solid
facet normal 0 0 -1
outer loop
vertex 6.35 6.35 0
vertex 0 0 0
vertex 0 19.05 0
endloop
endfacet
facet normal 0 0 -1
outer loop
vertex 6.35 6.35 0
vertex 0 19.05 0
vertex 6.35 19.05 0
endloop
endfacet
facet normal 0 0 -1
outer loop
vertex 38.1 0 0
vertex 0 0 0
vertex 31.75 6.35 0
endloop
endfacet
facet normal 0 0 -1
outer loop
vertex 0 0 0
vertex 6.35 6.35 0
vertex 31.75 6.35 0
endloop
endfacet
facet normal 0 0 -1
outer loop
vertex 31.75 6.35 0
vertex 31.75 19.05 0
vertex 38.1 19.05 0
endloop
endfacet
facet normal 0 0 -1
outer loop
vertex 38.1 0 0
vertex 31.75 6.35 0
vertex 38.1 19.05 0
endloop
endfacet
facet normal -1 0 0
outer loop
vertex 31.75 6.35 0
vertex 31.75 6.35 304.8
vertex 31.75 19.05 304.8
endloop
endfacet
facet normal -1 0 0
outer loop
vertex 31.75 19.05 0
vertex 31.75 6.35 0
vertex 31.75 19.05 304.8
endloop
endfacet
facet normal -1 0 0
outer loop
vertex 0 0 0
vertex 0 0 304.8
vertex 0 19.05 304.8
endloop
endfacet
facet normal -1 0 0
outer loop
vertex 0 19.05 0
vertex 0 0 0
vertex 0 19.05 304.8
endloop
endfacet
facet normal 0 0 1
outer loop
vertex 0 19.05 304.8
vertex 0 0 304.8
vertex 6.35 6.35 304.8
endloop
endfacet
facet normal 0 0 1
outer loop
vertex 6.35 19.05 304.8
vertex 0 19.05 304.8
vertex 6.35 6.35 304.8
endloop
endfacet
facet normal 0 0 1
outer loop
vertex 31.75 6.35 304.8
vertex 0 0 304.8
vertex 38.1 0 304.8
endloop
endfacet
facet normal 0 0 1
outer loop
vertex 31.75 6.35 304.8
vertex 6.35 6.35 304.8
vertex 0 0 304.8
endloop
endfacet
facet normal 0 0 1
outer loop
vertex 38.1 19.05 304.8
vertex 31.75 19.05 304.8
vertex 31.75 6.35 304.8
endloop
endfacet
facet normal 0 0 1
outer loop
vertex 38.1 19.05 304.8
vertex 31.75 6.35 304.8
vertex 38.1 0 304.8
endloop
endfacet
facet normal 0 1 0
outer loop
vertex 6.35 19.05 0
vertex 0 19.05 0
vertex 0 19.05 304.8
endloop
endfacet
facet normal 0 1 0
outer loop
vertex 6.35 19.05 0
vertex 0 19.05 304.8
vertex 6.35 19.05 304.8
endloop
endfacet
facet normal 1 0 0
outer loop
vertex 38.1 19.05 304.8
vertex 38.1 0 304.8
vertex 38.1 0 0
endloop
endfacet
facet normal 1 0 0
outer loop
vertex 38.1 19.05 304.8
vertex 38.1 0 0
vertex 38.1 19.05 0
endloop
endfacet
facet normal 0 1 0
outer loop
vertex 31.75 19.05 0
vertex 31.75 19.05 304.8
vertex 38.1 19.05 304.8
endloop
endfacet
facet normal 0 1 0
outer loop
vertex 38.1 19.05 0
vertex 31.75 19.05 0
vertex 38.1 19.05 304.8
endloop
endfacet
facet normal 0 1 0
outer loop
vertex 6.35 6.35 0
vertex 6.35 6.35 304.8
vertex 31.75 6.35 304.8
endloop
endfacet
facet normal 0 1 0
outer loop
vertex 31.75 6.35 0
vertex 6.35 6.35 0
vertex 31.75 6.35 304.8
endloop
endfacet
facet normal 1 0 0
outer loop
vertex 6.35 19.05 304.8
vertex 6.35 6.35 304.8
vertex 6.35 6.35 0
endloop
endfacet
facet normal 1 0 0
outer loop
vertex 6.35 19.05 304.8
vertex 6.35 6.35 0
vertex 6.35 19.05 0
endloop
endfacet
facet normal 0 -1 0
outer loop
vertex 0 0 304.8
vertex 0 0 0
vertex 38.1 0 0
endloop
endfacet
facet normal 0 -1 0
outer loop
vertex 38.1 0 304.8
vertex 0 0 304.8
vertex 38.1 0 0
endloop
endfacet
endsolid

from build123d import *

# Parameters (mm, degrees)
SKETCH1_W           = 38.1
SKETCH1_H           = 19.05
BOSS_EXTRUDE1_DEPTH = 304.8
CUT_EXTRUDE1_REACH  = 309.762
SKETCH2_W           = 25.4
SKETCH2_H           = 12.7


with BuildPart() as part:
    # Sketch1 → Boss-Extrude1 (new body)
    with BuildSketch(Plane.XY):
        with Locations((19.05, 9.525)):
            Rectangle(SKETCH1_W, SKETCH1_H)
    extrude(amount=BOSS_EXTRUDE1_DEPTH)

    # Sketch2 → Cut-Extrude1 (cut, up to next)
    with BuildSketch(Plane.XY.offset(304.8), mode=Mode.PRIVATE) as cut_extrude1_sk1:
        with Locations((19.05, 12.7)):
            Rectangle(SKETCH2_W, SKETCH2_H)
    cut_extrude1_tool1 = extrude(cut_extrude1_sk1.sketch, amount=-CUT_EXTRUDE1_REACH, mode=Mode.PRIVATE) & part.part
    add(cut_extrude1_tool1.solids().sort_by_distance((19.05, 12.7, 304.8))[0], mode=Mode.SUBTRACT)


solid = part.part
